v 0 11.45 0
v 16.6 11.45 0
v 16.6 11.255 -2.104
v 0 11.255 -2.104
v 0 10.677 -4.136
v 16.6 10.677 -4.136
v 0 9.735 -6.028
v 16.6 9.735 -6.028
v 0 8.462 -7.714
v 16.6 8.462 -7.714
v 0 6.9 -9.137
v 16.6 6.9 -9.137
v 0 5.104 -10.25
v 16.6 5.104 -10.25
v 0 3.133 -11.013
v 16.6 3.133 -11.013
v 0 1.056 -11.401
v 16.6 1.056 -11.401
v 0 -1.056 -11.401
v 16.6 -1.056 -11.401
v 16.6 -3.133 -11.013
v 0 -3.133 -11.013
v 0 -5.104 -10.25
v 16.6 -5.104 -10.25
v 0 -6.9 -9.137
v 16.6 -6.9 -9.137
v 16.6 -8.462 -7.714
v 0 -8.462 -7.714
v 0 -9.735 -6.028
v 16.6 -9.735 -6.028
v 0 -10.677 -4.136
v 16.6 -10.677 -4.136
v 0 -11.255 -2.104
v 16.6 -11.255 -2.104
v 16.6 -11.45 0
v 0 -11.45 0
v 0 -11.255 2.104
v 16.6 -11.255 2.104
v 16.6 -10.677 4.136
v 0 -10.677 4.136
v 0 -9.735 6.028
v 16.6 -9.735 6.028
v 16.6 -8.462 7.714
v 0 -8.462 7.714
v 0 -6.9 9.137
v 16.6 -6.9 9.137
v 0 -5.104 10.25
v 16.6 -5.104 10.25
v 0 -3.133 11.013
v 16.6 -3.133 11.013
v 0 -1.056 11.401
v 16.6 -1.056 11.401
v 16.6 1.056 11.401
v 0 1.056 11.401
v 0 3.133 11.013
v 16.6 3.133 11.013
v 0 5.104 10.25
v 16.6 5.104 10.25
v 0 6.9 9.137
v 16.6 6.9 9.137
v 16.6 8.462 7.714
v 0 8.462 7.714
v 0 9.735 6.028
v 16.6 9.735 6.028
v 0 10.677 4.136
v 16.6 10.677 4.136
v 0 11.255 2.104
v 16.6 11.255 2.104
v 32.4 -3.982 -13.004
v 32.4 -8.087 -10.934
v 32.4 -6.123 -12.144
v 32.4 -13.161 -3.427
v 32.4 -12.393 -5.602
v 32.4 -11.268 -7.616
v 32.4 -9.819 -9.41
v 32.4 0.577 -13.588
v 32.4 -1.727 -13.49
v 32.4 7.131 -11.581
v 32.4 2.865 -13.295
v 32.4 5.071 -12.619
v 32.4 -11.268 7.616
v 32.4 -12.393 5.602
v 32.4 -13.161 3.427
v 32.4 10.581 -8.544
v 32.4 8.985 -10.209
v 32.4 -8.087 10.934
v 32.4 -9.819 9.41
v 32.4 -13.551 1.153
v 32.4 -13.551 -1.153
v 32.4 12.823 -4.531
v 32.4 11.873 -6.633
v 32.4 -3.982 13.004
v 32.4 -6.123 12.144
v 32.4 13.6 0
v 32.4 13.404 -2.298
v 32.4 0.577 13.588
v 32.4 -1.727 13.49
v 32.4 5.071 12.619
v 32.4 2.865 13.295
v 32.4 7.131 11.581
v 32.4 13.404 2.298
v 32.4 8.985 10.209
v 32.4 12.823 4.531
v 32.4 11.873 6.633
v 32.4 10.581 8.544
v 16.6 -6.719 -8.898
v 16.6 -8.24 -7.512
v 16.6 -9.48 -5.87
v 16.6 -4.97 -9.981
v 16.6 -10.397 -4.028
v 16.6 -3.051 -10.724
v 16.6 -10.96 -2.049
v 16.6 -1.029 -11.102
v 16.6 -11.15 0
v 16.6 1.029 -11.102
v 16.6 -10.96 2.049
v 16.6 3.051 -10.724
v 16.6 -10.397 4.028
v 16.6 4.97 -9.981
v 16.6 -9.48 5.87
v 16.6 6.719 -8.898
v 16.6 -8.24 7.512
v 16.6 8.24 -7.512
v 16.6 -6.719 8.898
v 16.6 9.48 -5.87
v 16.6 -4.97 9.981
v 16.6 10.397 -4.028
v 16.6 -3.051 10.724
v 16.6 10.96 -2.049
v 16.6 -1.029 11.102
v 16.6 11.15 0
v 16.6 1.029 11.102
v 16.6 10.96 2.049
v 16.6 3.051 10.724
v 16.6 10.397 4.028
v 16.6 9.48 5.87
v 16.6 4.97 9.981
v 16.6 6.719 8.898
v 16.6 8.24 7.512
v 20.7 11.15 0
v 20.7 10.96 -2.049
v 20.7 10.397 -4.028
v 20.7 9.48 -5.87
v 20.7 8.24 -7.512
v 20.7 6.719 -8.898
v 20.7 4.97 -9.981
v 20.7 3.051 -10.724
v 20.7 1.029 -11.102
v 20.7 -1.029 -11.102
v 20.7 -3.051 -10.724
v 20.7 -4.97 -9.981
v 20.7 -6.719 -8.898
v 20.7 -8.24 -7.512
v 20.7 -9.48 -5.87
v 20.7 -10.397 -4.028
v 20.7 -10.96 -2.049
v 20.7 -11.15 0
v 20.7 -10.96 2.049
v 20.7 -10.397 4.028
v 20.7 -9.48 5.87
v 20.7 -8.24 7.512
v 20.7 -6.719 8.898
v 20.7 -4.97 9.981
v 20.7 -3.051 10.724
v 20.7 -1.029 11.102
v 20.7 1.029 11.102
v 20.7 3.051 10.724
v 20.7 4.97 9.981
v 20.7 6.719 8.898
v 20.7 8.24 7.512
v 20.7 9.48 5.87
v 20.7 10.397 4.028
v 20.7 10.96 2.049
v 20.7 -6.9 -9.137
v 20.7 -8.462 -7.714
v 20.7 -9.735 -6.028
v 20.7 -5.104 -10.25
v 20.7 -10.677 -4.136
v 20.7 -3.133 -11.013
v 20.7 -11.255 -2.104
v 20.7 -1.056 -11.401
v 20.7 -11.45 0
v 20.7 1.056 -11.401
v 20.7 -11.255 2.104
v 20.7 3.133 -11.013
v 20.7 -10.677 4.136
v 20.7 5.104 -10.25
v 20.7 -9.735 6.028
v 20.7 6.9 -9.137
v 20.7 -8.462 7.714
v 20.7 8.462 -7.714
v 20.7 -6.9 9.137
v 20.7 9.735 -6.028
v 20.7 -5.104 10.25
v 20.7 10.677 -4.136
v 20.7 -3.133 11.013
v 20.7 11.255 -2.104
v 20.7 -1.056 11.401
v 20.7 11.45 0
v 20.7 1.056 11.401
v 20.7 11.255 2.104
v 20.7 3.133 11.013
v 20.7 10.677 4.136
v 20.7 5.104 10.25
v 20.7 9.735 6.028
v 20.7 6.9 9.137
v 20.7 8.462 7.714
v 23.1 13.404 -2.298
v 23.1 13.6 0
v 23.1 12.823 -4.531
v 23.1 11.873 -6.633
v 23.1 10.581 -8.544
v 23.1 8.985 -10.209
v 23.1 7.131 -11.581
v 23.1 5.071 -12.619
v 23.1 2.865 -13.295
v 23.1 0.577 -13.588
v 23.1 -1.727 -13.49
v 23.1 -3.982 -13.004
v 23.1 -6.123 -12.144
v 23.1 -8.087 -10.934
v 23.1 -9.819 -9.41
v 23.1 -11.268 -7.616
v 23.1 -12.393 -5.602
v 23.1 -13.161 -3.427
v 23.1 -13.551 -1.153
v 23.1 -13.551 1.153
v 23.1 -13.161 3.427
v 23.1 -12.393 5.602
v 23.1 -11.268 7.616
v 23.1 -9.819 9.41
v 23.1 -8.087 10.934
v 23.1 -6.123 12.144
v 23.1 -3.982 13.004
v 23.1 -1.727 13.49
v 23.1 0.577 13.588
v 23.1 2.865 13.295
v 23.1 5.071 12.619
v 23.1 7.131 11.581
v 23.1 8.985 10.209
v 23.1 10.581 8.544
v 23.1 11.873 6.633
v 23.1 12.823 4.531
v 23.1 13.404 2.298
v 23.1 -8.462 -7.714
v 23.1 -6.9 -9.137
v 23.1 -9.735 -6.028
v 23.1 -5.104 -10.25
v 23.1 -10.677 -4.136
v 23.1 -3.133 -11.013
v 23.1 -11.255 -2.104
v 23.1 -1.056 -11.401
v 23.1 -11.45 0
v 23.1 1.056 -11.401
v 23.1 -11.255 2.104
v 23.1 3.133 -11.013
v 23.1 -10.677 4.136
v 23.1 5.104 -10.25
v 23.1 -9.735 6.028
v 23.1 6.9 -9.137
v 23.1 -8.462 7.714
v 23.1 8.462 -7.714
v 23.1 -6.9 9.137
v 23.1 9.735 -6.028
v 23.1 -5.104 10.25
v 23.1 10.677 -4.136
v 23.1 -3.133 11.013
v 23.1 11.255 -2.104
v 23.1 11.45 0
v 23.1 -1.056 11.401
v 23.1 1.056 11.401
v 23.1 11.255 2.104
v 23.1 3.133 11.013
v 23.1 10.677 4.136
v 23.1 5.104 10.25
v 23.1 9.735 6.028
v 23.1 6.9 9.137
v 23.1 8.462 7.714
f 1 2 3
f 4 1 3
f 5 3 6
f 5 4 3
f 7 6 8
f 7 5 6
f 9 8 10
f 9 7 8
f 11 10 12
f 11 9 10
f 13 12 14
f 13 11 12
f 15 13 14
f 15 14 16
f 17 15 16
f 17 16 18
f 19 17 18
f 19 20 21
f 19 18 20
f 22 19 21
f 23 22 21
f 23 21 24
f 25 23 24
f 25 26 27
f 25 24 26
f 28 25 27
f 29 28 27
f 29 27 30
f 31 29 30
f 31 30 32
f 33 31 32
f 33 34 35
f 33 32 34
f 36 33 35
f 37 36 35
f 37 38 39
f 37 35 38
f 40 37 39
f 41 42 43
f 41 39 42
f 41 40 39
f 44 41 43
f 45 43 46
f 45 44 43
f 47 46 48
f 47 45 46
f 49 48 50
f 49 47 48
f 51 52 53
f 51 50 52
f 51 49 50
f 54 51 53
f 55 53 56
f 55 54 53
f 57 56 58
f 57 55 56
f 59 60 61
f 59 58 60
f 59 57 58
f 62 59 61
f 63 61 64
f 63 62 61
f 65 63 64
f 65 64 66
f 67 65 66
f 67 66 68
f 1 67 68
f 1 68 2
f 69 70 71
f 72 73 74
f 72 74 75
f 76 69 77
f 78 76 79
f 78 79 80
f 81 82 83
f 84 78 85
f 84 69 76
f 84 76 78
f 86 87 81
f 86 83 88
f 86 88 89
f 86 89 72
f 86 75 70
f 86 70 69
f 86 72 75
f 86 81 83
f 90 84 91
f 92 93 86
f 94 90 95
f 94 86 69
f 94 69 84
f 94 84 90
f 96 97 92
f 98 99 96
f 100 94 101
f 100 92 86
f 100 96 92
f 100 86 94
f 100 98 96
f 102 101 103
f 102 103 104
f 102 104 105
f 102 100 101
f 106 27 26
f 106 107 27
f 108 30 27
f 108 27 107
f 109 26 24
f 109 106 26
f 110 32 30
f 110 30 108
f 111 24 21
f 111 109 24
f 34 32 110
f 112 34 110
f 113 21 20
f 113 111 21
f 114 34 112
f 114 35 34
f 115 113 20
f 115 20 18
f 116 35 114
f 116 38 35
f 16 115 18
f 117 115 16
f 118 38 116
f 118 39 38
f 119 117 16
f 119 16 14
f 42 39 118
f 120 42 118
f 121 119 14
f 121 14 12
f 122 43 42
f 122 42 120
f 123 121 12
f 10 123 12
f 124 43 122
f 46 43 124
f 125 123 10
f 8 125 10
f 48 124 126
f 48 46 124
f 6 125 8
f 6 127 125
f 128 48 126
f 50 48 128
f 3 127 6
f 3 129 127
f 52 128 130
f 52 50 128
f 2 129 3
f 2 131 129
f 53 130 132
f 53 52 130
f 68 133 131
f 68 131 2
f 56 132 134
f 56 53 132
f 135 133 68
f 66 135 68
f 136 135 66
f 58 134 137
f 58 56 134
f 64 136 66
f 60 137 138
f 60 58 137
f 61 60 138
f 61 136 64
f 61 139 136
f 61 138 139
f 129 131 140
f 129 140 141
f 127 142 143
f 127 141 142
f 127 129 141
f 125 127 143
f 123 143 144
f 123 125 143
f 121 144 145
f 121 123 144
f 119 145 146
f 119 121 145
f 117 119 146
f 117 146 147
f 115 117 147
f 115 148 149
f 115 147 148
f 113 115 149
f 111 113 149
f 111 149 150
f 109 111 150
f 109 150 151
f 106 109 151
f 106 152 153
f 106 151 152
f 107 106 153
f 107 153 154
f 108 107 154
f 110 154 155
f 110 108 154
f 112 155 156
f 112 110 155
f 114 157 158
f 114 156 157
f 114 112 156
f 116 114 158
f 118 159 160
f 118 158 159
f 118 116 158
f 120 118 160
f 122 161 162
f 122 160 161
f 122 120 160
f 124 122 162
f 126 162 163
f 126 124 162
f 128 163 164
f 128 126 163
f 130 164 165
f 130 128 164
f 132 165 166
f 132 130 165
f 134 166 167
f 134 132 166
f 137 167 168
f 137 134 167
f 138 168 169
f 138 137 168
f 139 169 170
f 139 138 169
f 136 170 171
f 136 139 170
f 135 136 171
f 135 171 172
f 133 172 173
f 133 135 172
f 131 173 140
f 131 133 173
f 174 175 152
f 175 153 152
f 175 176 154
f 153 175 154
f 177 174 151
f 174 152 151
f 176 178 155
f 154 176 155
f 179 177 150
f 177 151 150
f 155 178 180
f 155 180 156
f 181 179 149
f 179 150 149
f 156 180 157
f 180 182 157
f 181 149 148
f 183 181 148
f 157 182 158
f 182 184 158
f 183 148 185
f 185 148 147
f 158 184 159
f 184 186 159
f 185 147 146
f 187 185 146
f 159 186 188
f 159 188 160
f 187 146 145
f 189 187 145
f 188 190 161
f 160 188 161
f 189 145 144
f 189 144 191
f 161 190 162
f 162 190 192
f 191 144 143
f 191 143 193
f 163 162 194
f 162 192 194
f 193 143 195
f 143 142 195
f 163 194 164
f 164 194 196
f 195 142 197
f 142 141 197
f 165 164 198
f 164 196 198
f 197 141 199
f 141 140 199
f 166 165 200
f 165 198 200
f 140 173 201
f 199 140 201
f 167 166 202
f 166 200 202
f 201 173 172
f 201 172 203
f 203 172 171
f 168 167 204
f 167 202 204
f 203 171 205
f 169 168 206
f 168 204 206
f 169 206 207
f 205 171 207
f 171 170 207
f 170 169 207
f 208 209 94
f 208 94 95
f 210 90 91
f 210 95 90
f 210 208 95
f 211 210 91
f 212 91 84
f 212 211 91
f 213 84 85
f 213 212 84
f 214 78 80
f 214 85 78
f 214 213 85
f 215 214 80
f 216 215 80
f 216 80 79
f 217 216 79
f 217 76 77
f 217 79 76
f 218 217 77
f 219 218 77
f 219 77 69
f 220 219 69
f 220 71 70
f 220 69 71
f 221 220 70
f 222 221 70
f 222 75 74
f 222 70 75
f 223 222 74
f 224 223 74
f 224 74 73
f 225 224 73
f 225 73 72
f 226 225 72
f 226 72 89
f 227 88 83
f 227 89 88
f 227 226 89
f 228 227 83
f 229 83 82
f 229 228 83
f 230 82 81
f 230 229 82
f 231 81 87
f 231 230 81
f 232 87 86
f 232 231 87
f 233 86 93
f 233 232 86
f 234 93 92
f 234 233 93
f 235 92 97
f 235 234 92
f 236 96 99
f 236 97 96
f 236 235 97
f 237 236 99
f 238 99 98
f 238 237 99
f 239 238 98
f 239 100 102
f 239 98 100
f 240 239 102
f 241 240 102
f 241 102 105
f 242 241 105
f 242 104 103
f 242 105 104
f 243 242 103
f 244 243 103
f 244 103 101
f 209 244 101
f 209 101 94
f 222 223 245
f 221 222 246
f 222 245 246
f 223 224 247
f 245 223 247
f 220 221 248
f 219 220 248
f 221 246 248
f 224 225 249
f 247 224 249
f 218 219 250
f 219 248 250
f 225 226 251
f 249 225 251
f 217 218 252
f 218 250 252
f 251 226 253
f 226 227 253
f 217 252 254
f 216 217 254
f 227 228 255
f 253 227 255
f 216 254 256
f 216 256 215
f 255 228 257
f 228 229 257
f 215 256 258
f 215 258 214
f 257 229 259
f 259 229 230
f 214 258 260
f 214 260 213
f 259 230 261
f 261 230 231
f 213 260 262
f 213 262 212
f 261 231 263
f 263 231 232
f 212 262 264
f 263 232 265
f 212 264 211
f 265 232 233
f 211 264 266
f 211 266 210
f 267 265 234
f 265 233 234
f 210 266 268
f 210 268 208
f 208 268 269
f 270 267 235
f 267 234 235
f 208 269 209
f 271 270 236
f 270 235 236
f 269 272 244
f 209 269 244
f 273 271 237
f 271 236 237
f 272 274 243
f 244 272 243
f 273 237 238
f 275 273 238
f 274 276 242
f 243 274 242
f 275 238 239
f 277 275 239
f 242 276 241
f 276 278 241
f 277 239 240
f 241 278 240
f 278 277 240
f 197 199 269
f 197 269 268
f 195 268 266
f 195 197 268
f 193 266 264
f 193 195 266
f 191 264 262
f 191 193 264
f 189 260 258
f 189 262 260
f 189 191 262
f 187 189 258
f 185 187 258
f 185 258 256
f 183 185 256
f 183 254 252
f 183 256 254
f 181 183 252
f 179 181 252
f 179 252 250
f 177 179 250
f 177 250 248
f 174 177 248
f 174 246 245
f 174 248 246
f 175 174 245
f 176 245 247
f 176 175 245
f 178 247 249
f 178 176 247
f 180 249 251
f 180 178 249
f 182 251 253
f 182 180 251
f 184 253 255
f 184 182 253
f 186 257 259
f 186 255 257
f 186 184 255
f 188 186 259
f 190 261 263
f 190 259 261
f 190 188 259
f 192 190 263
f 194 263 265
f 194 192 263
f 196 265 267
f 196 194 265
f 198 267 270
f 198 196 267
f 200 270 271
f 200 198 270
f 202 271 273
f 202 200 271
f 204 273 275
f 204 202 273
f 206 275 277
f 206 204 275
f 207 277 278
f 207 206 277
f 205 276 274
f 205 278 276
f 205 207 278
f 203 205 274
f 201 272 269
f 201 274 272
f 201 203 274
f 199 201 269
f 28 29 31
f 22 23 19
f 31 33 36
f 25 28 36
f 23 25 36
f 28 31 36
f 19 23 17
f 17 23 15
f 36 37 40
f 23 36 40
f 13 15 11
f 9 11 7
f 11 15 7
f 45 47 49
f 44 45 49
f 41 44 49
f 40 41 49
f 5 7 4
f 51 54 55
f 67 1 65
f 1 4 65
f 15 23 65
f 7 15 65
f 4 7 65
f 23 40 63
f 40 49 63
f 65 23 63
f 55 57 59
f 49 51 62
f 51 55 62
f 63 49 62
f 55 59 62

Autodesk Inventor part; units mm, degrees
ref_plane "YZ Plane" through (0, 0, 0) normal (1, 0, 0) x (0, 1, 0)
ref_plane "XZ Plane" through (0, 0, 0) normal (0, 1, 0) x (-1, 0, 0)
ref_plane "XY Plane" through (0, 0, 0) normal (0, 0, 1) x (1, 0, 0)
sketch "Skizze1" plane through (0, 0, 0) normal (0, 0, 1) x (1, 0, 0)
  line L0 (0, 0) -> (16.6, 0)
  line L1 (16.6, 0) -> (16.6, 11.45)
  line L2 (16.6, 11.45) -> (0, 11.45)
  line L3 (0, 11.45) -> (0, 0)
  line L4 (16.6, 0) -> (20.7, 0)
  line L5 (20.7, 0) -> (20.7, 11.15)
  line L6 (20.7, 11.15) -> (16.6, 11.15)
  line L7 (16.6, 11.15) -> (16.6, 0)
  line L8 (20.7, 0) -> (23.1, 0)
  line L9 (23.1, 0) -> (23.1, 11.45)
  line L10 (23.1, 11.45) -> (20.7, 11.45)
  line L11 (20.7, 11.45) -> (20.7, 0)
  line L12 (23.1, 0) -> (32.4, 0)
  line L13 (32.4, 0) -> (32.4, 13.6)
  line L14 (32.4, 13.6) -> (23.1, 13.6)
  line L15 (23.1, 13.6) -> (23.1, 0)
  dimension "d1" = 11.45
  dimension "d2" = 4.1
  dimension "d3" = 11.15
  dimension "d4" = 2.4
  dimension "d5" = 9.3
  dimension "d6" = 13.6
  dimension "d8" = 32.4
revolve "Umdrehung1" add sketch "Skizze1" angle 360 about axis through (0, 0, 0) along (1, 0, 0)
properties part number "00_Eyepiece_WF20x 23,2mm"
